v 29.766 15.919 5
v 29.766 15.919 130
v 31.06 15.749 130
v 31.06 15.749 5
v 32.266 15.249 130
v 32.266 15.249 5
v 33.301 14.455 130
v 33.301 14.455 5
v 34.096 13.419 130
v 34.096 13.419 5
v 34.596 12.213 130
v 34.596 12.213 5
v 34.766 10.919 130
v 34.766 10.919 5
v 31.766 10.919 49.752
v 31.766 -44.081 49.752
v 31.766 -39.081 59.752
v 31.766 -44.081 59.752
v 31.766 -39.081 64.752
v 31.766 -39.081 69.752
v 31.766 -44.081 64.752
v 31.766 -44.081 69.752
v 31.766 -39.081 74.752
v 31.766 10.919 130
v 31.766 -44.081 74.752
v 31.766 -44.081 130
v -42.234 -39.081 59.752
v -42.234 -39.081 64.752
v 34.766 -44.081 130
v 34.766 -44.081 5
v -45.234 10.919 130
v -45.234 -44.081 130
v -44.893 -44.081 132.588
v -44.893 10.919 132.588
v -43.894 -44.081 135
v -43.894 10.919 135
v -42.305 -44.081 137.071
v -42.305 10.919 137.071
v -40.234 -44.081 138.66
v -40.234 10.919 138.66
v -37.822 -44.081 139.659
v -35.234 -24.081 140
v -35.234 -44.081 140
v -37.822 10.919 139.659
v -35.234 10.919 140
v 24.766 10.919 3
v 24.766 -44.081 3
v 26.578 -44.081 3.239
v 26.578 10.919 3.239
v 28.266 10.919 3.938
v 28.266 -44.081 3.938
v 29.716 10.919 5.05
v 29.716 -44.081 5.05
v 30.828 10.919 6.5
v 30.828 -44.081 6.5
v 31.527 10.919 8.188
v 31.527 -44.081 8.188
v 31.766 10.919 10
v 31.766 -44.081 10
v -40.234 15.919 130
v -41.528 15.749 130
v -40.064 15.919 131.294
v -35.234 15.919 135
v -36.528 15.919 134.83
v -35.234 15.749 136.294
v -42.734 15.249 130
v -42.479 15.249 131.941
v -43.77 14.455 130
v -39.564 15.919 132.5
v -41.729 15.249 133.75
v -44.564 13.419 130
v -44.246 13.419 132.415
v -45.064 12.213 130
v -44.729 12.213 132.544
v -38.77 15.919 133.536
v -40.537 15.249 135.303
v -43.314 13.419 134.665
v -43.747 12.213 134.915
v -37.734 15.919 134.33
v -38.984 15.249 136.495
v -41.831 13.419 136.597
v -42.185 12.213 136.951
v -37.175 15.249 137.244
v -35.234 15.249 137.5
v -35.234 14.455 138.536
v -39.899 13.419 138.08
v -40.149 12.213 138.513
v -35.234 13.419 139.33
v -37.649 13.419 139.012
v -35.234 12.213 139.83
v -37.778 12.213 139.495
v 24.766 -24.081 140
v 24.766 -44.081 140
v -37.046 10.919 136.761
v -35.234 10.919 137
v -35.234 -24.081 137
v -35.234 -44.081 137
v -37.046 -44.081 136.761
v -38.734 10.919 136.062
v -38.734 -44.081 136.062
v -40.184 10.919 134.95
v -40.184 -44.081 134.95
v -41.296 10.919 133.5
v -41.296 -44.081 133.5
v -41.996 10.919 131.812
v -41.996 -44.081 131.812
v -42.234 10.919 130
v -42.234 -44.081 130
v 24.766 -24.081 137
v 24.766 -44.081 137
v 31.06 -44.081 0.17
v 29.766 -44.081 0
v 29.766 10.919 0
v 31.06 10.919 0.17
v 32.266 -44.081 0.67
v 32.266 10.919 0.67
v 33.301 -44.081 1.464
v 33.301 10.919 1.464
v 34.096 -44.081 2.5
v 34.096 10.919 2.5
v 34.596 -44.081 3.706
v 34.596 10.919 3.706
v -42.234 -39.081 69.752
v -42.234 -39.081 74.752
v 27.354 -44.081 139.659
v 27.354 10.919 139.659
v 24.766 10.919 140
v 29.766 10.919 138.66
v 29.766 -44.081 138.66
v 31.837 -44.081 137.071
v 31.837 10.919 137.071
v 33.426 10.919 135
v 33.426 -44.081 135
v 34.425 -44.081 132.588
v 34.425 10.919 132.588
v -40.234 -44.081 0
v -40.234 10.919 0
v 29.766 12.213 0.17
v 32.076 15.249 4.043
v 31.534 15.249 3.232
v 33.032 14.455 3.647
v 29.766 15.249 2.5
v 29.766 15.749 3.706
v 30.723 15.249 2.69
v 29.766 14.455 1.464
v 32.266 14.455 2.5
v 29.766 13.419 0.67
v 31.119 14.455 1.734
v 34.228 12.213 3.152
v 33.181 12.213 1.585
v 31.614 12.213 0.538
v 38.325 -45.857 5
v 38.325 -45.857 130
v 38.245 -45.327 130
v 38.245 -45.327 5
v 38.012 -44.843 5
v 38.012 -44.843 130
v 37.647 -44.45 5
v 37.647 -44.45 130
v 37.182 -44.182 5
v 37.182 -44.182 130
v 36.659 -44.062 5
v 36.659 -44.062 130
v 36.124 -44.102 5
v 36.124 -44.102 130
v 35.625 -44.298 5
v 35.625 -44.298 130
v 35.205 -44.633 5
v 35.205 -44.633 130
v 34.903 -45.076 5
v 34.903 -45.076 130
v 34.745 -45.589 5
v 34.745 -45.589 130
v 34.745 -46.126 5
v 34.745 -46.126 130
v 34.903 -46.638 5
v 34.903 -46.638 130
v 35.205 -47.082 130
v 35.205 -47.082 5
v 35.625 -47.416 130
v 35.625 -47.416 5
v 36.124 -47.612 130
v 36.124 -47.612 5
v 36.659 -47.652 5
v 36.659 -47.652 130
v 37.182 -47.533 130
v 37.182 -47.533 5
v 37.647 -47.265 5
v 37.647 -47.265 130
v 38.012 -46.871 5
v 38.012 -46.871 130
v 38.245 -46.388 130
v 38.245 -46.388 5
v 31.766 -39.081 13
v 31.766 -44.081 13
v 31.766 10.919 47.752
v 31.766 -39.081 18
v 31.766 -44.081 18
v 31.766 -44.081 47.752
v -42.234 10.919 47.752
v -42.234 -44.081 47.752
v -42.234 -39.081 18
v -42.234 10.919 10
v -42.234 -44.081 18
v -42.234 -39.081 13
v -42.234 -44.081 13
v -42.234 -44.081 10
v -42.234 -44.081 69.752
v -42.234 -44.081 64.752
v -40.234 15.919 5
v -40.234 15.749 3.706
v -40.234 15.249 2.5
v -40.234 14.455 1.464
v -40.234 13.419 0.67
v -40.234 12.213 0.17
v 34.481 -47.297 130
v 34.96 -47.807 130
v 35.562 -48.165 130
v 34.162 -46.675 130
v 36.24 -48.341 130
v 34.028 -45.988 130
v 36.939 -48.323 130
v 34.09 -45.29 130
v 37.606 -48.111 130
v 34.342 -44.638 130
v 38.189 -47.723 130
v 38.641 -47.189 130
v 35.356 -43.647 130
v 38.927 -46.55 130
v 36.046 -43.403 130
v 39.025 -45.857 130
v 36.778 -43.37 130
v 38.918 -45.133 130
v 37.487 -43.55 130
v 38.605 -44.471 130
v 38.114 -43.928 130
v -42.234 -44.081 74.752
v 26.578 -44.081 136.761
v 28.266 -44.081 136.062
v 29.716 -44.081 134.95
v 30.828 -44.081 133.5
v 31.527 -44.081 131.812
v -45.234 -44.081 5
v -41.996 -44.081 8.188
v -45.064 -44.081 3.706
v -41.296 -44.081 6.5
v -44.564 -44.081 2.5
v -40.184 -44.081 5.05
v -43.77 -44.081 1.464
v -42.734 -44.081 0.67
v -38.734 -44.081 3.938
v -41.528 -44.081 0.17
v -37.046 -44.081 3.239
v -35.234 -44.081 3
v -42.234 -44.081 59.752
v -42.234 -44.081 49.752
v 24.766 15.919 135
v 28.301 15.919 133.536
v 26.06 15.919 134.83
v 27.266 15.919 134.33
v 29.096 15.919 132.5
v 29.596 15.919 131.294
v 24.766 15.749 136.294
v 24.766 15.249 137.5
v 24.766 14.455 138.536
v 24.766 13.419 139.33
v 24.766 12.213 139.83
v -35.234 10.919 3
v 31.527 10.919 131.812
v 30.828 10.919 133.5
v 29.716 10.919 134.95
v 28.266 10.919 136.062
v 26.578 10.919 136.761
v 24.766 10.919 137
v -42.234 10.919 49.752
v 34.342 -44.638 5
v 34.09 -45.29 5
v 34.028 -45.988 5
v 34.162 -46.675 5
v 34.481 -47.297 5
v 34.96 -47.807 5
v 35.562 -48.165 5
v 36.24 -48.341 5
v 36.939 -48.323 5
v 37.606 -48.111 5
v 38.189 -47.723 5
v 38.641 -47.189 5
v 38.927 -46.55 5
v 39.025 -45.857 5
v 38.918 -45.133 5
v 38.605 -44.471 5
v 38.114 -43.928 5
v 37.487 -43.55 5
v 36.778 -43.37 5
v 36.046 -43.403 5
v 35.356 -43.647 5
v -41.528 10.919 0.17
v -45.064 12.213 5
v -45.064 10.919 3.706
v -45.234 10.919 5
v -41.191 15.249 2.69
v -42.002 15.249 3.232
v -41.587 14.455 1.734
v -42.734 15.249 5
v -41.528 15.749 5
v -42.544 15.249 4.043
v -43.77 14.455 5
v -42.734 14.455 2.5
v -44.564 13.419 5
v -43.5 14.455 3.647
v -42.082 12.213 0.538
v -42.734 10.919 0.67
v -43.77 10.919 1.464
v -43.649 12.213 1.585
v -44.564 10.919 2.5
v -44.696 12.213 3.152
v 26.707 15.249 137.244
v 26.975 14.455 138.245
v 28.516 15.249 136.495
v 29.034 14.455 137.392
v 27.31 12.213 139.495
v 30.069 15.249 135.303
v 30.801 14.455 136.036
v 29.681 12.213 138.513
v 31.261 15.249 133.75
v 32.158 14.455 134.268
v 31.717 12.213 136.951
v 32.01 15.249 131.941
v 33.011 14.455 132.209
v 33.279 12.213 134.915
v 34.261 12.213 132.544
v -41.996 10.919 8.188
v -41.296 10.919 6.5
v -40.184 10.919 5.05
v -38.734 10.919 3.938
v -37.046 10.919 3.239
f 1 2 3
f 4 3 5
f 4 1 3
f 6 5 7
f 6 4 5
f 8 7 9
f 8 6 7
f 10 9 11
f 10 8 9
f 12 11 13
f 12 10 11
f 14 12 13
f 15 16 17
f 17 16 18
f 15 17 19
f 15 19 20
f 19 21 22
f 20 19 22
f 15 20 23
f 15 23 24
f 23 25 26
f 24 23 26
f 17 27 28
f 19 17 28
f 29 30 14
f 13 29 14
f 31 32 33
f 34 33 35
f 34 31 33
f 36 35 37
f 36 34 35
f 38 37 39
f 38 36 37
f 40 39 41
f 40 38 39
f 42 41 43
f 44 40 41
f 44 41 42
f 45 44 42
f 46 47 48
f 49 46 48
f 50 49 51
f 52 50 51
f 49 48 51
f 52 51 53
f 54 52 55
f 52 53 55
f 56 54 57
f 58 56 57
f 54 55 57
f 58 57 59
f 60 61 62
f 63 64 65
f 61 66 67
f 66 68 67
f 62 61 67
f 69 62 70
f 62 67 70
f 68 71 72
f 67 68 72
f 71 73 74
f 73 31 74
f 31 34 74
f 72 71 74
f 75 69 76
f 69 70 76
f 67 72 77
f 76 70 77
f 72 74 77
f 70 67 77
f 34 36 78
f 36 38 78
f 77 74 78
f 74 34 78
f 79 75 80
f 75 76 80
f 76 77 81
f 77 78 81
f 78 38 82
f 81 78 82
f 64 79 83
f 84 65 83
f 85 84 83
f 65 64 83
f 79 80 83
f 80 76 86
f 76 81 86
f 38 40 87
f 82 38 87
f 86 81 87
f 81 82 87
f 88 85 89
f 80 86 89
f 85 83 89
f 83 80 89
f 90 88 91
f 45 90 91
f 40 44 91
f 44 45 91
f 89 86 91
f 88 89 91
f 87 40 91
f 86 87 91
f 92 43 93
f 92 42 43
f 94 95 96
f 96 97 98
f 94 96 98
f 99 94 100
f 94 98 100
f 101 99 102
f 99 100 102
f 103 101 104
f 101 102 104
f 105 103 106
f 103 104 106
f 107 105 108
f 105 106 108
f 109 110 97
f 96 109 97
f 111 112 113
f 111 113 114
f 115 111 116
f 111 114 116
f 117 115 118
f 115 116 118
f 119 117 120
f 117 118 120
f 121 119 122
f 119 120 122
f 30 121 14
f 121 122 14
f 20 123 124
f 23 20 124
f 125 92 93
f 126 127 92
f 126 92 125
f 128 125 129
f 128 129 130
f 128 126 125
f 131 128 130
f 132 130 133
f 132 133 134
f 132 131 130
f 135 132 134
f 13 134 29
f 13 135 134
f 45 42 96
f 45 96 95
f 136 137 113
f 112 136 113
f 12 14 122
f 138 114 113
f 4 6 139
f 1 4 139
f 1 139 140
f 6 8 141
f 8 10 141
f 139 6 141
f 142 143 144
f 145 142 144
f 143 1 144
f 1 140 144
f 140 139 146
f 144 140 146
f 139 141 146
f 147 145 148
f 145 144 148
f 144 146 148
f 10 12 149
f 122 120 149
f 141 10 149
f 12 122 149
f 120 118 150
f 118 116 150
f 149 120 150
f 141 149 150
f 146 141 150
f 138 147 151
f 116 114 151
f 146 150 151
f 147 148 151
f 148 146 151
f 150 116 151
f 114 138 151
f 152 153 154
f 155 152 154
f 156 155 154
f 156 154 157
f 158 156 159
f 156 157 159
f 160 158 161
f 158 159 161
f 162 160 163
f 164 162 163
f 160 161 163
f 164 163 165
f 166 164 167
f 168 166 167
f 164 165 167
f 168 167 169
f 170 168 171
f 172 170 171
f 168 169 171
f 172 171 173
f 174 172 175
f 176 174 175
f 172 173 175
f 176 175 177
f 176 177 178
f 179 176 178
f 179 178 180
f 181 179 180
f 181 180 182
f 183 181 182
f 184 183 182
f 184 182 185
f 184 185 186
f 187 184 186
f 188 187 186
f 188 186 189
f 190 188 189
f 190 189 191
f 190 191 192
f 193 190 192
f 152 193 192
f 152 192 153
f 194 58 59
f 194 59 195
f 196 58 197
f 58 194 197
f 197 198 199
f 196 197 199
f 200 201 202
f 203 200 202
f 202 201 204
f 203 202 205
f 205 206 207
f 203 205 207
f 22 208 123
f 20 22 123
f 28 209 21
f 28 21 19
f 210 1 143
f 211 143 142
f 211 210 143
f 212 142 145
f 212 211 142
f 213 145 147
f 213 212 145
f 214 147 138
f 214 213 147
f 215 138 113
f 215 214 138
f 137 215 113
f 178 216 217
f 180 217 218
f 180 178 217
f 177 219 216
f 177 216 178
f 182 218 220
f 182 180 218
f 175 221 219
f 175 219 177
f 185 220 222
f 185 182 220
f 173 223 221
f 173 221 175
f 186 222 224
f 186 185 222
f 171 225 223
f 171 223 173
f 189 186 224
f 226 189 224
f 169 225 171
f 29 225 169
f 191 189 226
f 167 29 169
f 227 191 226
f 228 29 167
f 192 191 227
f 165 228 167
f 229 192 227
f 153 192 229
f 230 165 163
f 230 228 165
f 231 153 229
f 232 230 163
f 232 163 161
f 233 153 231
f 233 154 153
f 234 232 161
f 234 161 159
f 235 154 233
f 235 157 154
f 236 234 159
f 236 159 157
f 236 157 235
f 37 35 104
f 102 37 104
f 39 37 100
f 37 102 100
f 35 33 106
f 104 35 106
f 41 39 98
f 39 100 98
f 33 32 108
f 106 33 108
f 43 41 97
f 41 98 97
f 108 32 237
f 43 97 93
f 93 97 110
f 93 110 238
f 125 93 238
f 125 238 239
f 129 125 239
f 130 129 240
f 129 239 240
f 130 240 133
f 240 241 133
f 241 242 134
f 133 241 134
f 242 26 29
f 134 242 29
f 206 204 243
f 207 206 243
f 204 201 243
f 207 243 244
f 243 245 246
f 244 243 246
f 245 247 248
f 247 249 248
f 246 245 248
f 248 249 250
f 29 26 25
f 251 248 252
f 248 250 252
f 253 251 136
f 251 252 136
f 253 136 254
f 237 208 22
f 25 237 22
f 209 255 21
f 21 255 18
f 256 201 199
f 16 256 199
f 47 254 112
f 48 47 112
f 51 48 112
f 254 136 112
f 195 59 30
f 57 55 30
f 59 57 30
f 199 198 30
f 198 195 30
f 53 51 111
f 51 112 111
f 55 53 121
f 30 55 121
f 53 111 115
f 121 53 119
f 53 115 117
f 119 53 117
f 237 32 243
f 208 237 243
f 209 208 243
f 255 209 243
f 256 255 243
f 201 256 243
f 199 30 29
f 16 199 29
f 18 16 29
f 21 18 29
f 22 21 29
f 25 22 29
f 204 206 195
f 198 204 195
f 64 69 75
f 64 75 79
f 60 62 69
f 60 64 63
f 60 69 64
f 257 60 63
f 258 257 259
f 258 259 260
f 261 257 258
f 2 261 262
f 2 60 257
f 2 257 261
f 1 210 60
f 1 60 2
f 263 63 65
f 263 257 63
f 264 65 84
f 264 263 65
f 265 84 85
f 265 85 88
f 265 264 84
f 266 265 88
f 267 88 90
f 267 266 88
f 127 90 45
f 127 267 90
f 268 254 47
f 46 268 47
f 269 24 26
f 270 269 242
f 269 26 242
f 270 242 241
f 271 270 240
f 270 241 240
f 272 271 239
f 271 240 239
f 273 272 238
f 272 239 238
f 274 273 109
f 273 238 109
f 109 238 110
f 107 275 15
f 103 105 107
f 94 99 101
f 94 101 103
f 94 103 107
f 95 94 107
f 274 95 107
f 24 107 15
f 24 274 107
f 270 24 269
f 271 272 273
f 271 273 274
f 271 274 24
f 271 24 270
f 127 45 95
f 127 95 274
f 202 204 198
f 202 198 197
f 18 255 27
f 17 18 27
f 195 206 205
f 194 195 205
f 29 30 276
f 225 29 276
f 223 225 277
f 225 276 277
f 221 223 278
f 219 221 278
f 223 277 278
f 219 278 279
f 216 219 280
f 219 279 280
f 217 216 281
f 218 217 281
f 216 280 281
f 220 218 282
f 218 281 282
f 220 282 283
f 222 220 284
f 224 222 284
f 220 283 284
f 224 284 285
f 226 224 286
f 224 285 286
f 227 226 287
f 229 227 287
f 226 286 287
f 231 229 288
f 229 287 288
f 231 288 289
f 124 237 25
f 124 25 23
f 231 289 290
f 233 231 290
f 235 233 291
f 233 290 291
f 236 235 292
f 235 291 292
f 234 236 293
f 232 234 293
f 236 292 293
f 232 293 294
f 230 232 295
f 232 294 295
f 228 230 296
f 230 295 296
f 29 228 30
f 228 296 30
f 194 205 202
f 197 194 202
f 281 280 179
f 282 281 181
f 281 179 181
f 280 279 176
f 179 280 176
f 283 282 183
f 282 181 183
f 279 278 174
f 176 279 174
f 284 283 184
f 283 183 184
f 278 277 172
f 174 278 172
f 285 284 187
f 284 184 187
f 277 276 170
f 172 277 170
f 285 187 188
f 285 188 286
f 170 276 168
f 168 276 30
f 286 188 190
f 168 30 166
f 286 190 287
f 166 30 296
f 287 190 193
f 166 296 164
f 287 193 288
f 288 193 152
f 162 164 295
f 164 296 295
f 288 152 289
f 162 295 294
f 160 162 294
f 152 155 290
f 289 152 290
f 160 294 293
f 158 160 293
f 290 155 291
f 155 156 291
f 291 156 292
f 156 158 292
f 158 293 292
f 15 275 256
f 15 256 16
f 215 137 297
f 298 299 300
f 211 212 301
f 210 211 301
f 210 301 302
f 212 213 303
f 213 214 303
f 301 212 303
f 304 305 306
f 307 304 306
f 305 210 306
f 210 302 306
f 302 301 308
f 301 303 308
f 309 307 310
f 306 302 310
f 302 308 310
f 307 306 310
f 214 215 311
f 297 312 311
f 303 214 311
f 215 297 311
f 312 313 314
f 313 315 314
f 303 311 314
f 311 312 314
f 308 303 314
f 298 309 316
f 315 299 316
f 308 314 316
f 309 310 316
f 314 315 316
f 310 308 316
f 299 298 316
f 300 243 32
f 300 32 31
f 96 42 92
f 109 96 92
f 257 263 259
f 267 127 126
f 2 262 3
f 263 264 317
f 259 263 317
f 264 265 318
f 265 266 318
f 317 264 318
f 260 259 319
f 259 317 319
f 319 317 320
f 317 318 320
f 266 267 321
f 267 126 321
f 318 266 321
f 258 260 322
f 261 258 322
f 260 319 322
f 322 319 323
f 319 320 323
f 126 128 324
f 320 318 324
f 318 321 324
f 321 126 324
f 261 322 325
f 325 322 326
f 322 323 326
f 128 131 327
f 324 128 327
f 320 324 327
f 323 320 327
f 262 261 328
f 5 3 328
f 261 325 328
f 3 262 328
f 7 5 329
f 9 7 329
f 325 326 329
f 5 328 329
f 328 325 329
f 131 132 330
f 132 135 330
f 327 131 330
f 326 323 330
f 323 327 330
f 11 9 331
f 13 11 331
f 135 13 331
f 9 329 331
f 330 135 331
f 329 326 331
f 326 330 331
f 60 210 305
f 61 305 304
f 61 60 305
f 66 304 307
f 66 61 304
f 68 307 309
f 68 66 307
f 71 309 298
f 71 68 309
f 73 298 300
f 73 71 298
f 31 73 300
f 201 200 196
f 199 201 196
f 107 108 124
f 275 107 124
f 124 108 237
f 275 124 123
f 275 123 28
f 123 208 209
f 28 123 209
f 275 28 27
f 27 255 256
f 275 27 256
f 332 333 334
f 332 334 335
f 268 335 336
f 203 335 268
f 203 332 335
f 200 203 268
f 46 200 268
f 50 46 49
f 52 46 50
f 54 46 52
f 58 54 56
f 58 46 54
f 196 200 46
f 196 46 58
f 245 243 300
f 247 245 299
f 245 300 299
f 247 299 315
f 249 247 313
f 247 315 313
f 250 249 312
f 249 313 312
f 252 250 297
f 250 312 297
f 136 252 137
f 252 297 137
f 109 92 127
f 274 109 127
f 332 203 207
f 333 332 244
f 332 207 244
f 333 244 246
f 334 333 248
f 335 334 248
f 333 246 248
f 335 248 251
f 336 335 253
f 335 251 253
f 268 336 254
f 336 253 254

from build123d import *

# Parameters (mm, degrees)
F0_W      = 80
F0_H      = 60
F1_DEPTH  = 140
F2_R      = 10
F3_R      = 10
F4_R      = 5
F5_R      = 5
F7_DEPTH  = 55
F9_W      = 74
F9_H      = 2
F10_DEPTH = 55
F11_W     = 60
F11_H     = 35
F12_DEPTH = 28
F13_R     = 4.99999
F14_W     = 5
F14_H     = 5
F15_DEPTH = 74
F16_W     = 5
F16_H     = 5
F17_DEPTH = 74
F18_R     = 2.5
F19_DEPTH = 130
F20_DEPTH = 5
F21_W     = 5
F21_H     = 5
F22_DEPTH = 74
F23_R     = 1.8
F24_DEPTH = 132


# Not quite as in the source:
# - a fillet or chamfer is up to 0.001 mm smaller than in the source, because OpenCascade refuses the exact size
# - a feature names something its author has since deleted; it is built from what else it names


with BuildPart() as f1:
    # F0 (on Top) → F1 (new body)
    with BuildSketch(Plane.XY):
        with Locations((-5.2340733026, -14.0806569159)):
            Rectangle(F0_W, F0_H)
    extrude(amount=F1_DEPTH)

    # F2
    f2_edges = [f1.edges().sort_by_distance(p)[0] for p in [
        (-45.234073, -14.080657, 140),
    ]]
    fillet(f2_edges, radius=F2_R)

    # F3
    f3_edges = [f1.edges().sort_by_distance(p)[0] for p in [
        (34.765927, -14.080657, 140),
    ]]
    fillet(f3_edges, radius=F3_R)

    # F4
    f4_edges = [f1.edges().sort_by_distance(p)[0] for p in [
        (-45.234073, -14.080657, 0),
    ]]
    fillet(f4_edges, radius=F4_R)

    # F5
    f5_edges = [f1.edges().sort_by_distance(p)[0] for p in [
        (34.765927, -14.080657, 0),
    ]]
    fillet(f5_edges, radius=F5_R)

    # F6 (on face) → F7 (cut)
    with BuildSketch(Plane.XZ.offset(44.0806569159)):
        with BuildLine():
            Line((24.7659266974, 137), (-35.2340733026, 137))
            ThreePointArc((-35.2340733026, 137), (-40.1838207709, 134.9497474683), (-42.2340733026, 130))
            Line((-42.2340733026, 130), (-42.2340733026, 10))
            ThreePointArc((-42.2340733026, 10), (-40.1838207709, 5.0502525317), (-35.2340733026, 3))
            Line((-35.2340733026, 3), (24.7659266974, 3))
            ThreePointArc((24.7659266974, 3), (29.7156741658, 5.0502525317), (31.7659266974, 10))
            Line((31.7659266974, 10), (31.7659266974, 130))
            ThreePointArc((31.7659266974, 130), (29.7156741658, 134.9497474683), (24.7659266974, 137))
        make_face()
    extrude(amount=-F7_DEPTH, mode=Mode.SUBTRACT)

    # F9 (on face) → F10 (join)
    with BuildSketch(Plane.XZ.offset(-10.9193430841)):
        with Locations((-5.2340733026, 48.7519614398)):
            Rectangle(F9_W, F9_H)
    extrude(amount=F10_DEPTH)

    # F11 (on face) → F12 (cut)
    with BuildSketch(Plane.XY.offset(140)):
        with Locations((-5.2340733026, -6.5806569159)):
            Rectangle(F11_W, F11_H)
    extrude(amount=-F12_DEPTH, mode=Mode.SUBTRACT)

    # F13 (radius 5 in the source; OpenCascade refuses exactly that, so slightly less here)
    f13_edges = [f1.edges().sort_by_distance(p)[0] for p in [
        (-5.234073, 15.919343, 140),
    ]]
    fillet(f13_edges, radius=F13_R)

    # F14 (on face) → F15 (join)
    with BuildSketch(Plane.YZ.offset(-42.2340733026)):
        with Locations((-41.5806569159, 62.2519614398)):
            Rectangle(F14_W, F14_H)
    extrude(amount=F15_DEPTH)

    # F16 (on face) → F17 (join)
    with BuildSketch(Plane.YZ.offset(-42.2340733026)):
        with Locations((-41.5806569159, 72.2519614398)):
            Rectangle(F16_W, F16_H)
    extrude(amount=F17_DEPTH)

    # F18 (on Top) → F19 (join)
    with BuildSketch(Plane.XY):
        with Locations((36.524810933, -45.8572621748)):
            Circle(F18_R)
    extrude(amount=F19_DEPTH)

    # F20 (cut): a face of the model
    f20_faces = [f1.faces().sort_by_distance(p)[0] for p in [
        (36.524810933, -45.8572621748, 0),
    ]]
    extrude(f20_faces, amount=-F20_DEPTH, mode=Mode.SUBTRACT)

    # F21 (on face) → F22 (join)
    with BuildSketch(Plane.YZ.offset(-42.2340733026)):
        with Locations((-41.5806569159, 15.5)):
            Rectangle(F21_W, F21_H)
    extrude(amount=F22_DEPTH)

    # F23 (on face) → F24 (cut)
    with BuildSketch(Plane.XY.offset(130)):
        with Locations((36.524810933, -45.8572621748)):
            Circle(F23_R)
    extrude(amount=-F24_DEPTH, mode=Mode.SUBTRACT)


solid = f1.part
